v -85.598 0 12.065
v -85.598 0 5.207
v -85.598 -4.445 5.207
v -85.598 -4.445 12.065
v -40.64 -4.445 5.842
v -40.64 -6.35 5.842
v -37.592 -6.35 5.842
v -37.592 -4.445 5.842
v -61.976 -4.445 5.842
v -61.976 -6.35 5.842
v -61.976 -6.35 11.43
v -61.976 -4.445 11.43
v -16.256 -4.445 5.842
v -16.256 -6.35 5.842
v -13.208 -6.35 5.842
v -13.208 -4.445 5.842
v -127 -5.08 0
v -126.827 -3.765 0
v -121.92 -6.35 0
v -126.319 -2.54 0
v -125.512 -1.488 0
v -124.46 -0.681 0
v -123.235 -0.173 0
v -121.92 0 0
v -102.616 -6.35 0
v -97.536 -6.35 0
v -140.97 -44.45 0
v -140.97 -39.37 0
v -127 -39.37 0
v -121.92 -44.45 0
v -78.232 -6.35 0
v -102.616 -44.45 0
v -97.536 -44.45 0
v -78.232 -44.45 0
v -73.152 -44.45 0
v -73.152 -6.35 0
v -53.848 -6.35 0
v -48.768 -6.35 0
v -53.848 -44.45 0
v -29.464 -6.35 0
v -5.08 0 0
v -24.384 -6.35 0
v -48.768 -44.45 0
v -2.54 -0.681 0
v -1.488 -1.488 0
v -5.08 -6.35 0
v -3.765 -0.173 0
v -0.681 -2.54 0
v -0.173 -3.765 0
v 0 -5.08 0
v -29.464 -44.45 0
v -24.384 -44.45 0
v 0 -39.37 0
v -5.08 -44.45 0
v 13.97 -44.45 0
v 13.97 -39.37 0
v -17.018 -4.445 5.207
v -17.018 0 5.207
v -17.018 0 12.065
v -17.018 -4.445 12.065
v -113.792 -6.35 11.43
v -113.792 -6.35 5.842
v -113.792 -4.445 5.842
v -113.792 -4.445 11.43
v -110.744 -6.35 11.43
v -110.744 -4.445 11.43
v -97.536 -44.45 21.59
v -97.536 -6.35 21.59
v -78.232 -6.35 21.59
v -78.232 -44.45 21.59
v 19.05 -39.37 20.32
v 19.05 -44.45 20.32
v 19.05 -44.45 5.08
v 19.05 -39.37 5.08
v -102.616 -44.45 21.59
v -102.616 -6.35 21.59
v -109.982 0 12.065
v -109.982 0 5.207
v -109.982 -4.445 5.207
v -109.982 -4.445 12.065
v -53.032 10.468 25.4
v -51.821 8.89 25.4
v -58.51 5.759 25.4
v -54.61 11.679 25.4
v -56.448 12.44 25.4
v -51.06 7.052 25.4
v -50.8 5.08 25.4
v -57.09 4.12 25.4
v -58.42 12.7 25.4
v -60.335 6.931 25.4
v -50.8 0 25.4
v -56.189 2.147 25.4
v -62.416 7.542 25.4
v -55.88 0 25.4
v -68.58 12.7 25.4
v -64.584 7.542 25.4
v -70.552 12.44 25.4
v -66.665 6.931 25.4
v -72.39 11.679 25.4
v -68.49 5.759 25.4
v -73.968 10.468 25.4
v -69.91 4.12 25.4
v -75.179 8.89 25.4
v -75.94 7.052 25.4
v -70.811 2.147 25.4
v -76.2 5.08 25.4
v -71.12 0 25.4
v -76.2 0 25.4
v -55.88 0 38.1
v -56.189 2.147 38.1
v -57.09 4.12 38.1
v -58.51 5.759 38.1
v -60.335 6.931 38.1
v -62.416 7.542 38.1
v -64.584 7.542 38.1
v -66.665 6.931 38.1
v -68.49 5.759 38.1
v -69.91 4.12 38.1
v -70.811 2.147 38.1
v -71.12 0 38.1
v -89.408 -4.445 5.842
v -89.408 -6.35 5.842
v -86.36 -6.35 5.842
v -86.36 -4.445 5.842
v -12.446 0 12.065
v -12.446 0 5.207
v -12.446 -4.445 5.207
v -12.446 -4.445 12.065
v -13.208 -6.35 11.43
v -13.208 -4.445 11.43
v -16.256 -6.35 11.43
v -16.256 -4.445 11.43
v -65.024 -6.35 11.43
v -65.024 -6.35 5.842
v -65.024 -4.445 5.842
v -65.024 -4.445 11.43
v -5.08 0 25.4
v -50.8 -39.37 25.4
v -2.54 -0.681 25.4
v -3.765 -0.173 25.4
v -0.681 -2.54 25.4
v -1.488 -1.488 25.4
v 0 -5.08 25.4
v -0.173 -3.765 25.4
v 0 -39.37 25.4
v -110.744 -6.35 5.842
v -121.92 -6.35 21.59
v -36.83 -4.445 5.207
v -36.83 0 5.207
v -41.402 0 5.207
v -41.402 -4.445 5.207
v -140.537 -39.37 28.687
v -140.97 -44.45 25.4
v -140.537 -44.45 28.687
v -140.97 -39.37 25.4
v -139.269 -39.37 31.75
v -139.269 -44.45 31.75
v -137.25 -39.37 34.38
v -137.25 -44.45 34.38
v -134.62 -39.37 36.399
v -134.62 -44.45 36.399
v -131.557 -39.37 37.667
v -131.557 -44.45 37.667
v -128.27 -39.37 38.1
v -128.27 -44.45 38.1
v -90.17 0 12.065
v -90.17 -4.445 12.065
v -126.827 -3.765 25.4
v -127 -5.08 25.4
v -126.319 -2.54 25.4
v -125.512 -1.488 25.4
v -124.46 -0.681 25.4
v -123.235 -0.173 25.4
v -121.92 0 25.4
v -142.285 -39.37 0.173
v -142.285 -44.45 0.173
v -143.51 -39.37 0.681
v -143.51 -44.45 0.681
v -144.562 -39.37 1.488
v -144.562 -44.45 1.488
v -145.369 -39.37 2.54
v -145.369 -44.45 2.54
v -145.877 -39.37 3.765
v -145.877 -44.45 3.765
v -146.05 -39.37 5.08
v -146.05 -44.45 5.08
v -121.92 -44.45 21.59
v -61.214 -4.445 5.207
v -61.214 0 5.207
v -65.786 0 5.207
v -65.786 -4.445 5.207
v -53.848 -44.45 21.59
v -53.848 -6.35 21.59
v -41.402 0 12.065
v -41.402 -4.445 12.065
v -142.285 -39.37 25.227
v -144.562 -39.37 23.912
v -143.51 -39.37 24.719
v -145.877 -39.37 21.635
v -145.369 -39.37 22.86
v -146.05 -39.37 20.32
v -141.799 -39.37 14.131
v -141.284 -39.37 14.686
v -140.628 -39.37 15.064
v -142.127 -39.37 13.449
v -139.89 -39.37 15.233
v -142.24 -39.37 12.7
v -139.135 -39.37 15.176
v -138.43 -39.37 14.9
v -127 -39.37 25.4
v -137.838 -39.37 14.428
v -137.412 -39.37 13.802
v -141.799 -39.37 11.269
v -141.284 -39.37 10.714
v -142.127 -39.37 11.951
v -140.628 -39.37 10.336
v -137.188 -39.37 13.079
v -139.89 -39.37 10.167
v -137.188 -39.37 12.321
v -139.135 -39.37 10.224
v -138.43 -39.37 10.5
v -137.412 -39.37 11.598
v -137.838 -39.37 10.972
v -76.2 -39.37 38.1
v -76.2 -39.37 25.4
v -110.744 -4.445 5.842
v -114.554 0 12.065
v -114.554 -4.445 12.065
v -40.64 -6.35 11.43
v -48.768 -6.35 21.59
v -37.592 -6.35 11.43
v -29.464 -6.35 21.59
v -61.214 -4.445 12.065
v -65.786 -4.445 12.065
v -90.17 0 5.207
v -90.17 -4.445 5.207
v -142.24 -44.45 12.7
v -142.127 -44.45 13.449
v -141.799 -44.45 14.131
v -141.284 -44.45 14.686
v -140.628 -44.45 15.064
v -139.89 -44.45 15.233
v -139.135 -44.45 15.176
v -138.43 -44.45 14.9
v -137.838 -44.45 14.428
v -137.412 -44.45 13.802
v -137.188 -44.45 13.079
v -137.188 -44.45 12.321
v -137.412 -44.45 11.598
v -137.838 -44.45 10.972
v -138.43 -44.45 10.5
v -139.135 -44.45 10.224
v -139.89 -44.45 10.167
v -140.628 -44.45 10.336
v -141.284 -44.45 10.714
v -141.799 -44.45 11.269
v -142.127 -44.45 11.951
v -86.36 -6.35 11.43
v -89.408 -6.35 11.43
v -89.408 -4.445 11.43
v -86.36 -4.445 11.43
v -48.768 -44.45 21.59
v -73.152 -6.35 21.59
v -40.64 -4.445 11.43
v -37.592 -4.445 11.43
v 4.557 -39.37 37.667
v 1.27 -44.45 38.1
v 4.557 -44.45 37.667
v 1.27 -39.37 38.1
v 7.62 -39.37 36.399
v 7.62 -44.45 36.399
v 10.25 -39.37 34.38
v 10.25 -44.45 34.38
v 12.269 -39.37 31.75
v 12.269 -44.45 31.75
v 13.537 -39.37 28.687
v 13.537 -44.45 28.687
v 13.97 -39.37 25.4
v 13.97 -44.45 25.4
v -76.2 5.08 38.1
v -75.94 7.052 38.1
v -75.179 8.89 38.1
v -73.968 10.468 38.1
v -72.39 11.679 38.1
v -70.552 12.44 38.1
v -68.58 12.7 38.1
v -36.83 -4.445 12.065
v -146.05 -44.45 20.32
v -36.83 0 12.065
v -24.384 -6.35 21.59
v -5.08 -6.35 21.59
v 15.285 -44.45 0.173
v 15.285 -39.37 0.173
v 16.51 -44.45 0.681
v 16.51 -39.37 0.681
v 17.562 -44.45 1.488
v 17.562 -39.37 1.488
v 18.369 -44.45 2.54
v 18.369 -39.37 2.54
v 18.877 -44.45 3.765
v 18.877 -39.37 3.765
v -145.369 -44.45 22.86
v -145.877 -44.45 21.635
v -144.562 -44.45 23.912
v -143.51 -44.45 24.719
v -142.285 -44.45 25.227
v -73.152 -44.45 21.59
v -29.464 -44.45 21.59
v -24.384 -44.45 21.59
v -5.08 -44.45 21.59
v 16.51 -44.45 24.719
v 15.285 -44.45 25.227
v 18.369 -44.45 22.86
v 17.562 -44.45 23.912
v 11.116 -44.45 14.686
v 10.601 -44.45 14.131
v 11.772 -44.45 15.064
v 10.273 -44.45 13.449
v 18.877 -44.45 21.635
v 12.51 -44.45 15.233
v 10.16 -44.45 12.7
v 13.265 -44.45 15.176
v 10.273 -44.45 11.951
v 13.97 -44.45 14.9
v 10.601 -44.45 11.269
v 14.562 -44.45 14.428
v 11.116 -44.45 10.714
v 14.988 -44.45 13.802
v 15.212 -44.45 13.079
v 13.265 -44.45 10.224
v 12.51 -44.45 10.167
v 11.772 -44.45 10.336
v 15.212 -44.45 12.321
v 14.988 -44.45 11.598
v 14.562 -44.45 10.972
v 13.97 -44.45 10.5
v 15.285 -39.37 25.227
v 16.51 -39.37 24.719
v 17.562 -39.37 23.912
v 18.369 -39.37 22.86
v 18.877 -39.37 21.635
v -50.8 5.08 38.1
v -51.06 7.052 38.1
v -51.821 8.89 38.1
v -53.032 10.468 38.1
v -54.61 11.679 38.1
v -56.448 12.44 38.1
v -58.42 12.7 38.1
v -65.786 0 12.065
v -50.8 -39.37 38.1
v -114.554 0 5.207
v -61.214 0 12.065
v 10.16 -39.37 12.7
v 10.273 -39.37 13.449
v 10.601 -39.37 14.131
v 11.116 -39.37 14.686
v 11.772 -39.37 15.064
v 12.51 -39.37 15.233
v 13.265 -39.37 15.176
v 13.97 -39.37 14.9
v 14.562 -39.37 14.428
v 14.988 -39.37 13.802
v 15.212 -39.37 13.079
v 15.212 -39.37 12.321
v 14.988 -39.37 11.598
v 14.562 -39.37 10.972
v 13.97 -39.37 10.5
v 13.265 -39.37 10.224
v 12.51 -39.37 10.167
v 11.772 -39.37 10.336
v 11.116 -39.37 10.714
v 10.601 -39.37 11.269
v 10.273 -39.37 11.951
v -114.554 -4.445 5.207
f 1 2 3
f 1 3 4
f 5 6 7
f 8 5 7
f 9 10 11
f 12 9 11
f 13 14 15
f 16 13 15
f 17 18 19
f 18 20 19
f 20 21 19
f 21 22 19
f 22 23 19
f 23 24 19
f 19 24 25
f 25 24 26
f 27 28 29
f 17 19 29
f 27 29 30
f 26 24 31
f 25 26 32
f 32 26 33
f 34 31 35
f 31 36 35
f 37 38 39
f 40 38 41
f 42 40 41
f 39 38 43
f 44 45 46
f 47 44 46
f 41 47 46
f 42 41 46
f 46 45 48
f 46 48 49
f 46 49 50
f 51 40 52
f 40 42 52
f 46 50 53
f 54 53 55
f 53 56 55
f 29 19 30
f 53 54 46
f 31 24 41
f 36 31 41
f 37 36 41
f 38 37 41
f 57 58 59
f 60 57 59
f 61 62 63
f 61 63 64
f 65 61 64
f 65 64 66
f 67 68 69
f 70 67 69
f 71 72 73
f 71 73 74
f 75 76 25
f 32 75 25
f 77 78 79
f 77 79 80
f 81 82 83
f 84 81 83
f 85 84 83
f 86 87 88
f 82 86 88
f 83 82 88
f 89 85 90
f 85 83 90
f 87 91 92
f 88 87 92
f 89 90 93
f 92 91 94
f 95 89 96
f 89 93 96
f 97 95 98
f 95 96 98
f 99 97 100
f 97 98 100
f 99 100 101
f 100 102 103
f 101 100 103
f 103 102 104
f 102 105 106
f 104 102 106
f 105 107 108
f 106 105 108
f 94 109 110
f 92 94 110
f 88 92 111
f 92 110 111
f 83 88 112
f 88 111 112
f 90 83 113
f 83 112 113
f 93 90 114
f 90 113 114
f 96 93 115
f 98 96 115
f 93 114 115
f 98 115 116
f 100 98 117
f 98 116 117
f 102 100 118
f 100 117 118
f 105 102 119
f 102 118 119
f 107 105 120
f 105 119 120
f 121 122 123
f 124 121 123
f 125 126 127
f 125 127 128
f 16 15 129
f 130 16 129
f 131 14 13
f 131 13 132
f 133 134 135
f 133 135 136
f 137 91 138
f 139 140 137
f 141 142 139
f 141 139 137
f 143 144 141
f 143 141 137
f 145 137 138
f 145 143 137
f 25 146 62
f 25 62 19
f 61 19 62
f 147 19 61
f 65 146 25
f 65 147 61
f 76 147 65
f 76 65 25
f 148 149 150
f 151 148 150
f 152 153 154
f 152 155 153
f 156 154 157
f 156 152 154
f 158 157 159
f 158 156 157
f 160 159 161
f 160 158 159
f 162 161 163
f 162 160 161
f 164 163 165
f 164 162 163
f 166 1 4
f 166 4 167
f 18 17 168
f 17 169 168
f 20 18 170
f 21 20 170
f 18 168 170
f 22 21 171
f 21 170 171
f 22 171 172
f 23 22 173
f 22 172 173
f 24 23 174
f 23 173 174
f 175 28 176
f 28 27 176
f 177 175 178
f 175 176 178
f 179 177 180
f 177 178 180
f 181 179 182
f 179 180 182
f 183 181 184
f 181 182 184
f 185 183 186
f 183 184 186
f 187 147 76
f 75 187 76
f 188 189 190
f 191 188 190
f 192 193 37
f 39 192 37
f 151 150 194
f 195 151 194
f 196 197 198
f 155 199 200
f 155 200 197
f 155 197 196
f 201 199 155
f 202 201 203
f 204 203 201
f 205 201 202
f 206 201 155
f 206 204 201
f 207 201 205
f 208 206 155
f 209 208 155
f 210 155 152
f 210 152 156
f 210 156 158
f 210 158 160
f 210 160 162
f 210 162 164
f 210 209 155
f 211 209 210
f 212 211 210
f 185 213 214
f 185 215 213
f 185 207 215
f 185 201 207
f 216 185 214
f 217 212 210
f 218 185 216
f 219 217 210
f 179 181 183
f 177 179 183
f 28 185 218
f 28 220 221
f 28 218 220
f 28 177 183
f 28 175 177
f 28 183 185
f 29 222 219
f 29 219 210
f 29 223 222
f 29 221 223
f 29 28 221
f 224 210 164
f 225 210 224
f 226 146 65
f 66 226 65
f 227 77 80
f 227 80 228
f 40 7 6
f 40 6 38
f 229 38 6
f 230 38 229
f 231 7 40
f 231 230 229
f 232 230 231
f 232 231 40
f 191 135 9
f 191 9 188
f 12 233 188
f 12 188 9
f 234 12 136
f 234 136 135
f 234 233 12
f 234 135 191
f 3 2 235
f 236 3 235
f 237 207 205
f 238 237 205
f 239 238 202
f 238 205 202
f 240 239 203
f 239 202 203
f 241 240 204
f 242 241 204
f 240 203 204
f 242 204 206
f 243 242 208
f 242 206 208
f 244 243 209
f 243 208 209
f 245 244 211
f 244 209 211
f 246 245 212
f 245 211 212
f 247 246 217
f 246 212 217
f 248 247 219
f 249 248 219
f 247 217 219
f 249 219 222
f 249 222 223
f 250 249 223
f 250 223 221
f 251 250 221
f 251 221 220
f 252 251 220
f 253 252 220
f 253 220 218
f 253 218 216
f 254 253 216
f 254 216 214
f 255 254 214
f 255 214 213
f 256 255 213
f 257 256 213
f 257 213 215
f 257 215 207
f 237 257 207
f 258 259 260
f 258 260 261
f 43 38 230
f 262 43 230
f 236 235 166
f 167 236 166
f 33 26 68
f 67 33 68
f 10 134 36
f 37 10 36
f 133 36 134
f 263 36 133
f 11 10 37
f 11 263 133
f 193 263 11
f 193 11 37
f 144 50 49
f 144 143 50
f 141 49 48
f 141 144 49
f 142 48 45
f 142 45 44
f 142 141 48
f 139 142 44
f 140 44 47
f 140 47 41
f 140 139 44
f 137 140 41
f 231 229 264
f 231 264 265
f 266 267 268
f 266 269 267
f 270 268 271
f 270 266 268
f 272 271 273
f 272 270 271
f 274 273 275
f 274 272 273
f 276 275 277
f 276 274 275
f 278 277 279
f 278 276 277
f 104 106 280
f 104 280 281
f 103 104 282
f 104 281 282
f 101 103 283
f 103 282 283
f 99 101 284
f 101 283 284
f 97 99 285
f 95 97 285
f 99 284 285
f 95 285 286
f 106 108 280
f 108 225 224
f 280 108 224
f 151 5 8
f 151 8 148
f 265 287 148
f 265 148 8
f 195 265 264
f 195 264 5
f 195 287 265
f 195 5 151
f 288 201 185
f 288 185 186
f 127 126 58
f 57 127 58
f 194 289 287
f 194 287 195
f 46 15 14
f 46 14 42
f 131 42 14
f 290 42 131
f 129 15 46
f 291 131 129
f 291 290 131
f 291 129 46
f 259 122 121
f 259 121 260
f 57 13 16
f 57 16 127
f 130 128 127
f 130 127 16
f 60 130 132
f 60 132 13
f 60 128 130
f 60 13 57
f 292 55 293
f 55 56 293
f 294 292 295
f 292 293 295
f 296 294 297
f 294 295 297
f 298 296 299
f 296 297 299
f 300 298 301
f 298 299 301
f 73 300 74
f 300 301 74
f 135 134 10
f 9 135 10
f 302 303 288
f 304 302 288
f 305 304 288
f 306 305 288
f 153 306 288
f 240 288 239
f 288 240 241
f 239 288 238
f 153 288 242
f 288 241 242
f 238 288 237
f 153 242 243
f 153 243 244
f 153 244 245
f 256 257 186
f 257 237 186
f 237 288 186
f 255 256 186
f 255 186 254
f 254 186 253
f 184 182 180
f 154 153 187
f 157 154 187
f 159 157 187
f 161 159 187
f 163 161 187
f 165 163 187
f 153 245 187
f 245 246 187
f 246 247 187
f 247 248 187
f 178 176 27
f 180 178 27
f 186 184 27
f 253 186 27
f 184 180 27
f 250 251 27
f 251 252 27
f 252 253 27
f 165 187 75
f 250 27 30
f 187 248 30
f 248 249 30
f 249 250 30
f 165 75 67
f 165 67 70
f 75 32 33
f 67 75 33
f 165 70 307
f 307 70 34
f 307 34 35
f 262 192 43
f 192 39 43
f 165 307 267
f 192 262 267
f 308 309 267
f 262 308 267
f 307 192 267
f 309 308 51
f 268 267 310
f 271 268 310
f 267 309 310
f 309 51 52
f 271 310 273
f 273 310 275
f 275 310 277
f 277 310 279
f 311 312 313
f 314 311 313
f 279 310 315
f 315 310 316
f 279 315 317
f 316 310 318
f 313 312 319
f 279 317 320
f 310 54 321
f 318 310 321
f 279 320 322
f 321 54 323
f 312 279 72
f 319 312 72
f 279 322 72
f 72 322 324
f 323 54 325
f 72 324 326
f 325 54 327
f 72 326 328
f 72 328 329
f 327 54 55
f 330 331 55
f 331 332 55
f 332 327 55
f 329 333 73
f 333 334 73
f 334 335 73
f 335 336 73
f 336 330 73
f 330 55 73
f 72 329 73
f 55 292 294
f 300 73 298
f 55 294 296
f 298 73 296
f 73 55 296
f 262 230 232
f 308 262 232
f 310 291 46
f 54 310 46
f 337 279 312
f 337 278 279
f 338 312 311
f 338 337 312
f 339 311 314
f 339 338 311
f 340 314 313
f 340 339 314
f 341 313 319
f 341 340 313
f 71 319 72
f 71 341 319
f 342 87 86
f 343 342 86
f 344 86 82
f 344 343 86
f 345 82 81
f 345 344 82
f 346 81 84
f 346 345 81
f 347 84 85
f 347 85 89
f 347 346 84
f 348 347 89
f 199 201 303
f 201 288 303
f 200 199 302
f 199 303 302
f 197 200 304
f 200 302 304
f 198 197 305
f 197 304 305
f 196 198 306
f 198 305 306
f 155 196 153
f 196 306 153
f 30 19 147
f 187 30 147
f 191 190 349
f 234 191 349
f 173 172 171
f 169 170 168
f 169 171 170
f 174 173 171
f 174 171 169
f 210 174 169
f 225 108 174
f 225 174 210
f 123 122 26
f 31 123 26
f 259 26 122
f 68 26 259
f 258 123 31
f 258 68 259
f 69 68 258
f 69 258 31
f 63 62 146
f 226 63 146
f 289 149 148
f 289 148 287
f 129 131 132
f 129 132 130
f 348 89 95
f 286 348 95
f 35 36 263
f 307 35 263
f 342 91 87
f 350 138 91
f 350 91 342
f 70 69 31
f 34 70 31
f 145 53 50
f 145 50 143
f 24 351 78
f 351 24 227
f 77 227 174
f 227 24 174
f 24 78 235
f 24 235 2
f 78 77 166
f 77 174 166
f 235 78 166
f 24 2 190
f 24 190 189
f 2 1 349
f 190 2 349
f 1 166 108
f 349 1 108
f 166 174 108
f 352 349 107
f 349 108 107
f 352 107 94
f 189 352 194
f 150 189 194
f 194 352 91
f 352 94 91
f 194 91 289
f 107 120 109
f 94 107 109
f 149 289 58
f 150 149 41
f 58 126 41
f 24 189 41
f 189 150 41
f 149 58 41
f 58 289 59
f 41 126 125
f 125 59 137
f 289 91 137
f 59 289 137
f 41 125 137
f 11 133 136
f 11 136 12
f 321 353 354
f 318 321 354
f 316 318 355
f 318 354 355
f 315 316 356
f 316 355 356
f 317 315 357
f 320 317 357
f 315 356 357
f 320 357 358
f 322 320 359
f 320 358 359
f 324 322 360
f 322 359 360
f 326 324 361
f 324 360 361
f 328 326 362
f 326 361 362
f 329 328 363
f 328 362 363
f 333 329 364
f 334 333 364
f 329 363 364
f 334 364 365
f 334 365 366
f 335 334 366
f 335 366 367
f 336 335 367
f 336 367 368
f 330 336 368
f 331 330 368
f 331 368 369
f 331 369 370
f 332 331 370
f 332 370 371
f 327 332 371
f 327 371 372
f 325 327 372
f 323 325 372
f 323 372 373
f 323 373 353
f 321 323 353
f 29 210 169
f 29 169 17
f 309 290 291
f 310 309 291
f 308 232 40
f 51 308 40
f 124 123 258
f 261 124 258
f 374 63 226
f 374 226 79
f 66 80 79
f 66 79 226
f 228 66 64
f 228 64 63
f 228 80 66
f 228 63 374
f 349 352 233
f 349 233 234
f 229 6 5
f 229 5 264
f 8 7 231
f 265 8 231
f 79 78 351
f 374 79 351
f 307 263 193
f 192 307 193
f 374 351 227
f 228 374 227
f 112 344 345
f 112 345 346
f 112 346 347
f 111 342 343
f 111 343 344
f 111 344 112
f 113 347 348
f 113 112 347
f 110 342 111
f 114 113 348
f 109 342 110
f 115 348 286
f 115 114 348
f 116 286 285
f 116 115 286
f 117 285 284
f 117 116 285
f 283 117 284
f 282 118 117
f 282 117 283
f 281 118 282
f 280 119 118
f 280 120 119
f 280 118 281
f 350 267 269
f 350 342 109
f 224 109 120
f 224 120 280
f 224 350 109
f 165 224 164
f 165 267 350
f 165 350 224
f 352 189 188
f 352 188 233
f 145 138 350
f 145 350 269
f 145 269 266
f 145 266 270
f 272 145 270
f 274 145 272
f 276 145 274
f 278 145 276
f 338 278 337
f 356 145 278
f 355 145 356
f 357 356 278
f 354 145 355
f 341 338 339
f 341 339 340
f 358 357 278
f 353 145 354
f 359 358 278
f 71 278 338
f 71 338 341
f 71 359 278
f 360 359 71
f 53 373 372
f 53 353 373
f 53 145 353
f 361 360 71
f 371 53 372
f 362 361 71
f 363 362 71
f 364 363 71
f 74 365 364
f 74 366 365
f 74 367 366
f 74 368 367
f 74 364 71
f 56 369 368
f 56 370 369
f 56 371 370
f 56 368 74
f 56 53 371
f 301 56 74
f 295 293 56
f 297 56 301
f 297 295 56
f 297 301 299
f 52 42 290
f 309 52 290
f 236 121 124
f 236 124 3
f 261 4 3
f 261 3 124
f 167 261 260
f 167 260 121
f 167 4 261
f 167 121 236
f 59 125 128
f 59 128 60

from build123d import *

# Parameters (mm, degrees)
F0_W      = 127
F0_H      = 25.4
F1_DEPTH  = 6.35
F2_W      = 19.304
F2_H      = 3.81
F3_DEPTH  = 38.1
F4_W      = 3.048
F4_H      = 5.588
F5_DEPTH  = 6.351
F6_W      = 3.048
F6_H      = 5.588
F7_DEPTH  = 6.351
F8_W      = 4.572
F8_H      = 6.858
F8_W_2    = 3.048
F8_H_2    = 5.588
F9_DEPTH  = 4.445
F10_W     = 5.08
F10_H     = 25.4
F11_DEPTH = 19.05
F12_W     = 5.08
F12_H     = 25.4
F13_DEPTH = 19.05
F14_R     = 2.54
F15_DEPTH = 5.081
F16_R     = 5.08
F17_W     = 154.94
F17_H     = 5.08
F18_DEPTH = 12.7
F19_R     = 12.69999
F20_W     = 25.4
F20_H     = 39.37
F21_DEPTH = 12.7
F22_W     = 25.4
F22_H     = 12.7
F23_DEPTH = 12.7
F25_DEPTH = 38.101
F26_R     = 7.62


# Not quite as in the source:
# - a fillet or chamfer is up to 0.001 mm smaller than in the source, because OpenCascade refuses the exact size


with BuildPart() as f1:
    # F0 (on Front) → F1 (new body)
    with BuildSketch(Plane.XZ):
        with Locations((-63.5, 12.7)):
            Rectangle(F0_W, F0_H)
    extrude(amount=F1_DEPTH)

    # F2 (on face) → F3 (join)
    with BuildSketch(Plane.XZ.offset(6.35)):
        Polygon((-121.92, 25.4), (-127, 25.4), (-127, 0), (-121.92, 0), (-121.92, 21.59), align=None)
        with Locations((-112.268, 23.495)):
            Rectangle(F2_W, F2_H)
        Polygon((-97.536, 25.4), (-102.616, 25.4), (-102.616, 21.59), (-102.616, 0), (-97.536, 0), (-97.536, 21.59), align=None)
        with Locations((-87.884, 23.495)):
            Rectangle(F2_W, F2_H)
        Polygon((-73.152, 25.4), (-78.232, 25.4), (-78.232, 21.59), (-78.232, 0), (-73.152, 0), (-73.152, 21.59), align=None)
        with Locations((-63.5, 23.495)):
            Rectangle(F2_W, F2_H)
        Polygon((-48.768, 25.4), (-53.848, 25.4), (-53.848, 21.59), (-53.848, 0), (-48.768, 0), (-48.768, 21.59), align=None)
        with Locations((-39.116, 23.495)):
            Rectangle(F2_W, F2_H)
        Polygon((-24.384, 25.4), (-29.464, 25.4), (-29.464, 21.59), (-29.464, 0), (-24.384, 0), (-24.384, 21.59), align=None)
        with Locations((-14.732, 23.495)):
            Rectangle(F2_W, F2_H)
        Polygon((0, 25.4), (-5.08, 25.4), (-5.08, 21.59), (-5.08, 0), (0, 0), align=None)
    extrude(amount=F3_DEPTH)

    # F4 (on face) → F5 (cut, through all)
    with BuildSketch(Plane.XZ.offset(6.35)):
        with Locations((-14.732, 8.636)):
            Rectangle(F4_W, F4_H)
    extrude(amount=-F5_DEPTH, mode=Mode.SUBTRACT)

    # F6 (on face) → F7 (cut, through all)
    with BuildSketch(Plane.XZ.offset(6.35)):
        with Locations((-39.116, 8.636)):
            Rectangle(F6_W, F6_H)
        with Locations((-63.5, 8.636)):
            Rectangle(F6_W, F6_H)
        with Locations((-87.884, 8.636)):
            Rectangle(F6_W, F6_H)
        with Locations((-112.268, 8.636)):
            Rectangle(F6_W, F6_H)
    extrude(amount=-F7_DEPTH, mode=Mode.SUBTRACT)

    # F8 (on face) → F9 (cut)
    with BuildSketch(Plane(origin=(0, 0, 0), x_dir=(-1, 0, 0), z_dir=(0, 1, 0))):
        with Locations((14.732, 8.636)):
            Rectangle(F8_W, F8_H)
        with Locations((14.732, 8.636)):
            Rectangle(F8_W_2, F8_H_2, mode=Mode.SUBTRACT)
        with Locations((112.268, 8.636)):
            Rectangle(F8_W, F8_H)
        with Locations((112.268, 8.636)):
            Rectangle(F8_W_2, F8_H_2, mode=Mode.SUBTRACT)
        with Locations((87.884, 8.636)):
            Rectangle(F8_W, F8_H)
        with Locations((87.884, 8.636)):
            Rectangle(F8_W_2, F8_H_2, mode=Mode.SUBTRACT)
        with Locations((63.5, 8.636)):
            Rectangle(F8_W, F8_H)
        with Locations((63.5, 8.636)):
            Rectangle(F8_W_2, F8_H_2, mode=Mode.SUBTRACT)
        with Locations((39.116, 8.636)):
            Rectangle(F8_W, F8_H)
        with Locations((39.116, 8.636)):
            Rectangle(F8_W_2, F8_H_2, mode=Mode.SUBTRACT)
    extrude(amount=-F9_DEPTH, mode=Mode.SUBTRACT)

    # F10 (on face) → F11 (join)
    with BuildSketch(Plane.YZ):
        with Locations((-41.91, 12.7)):
            Rectangle(F10_W, F10_H)
    extrude(amount=F11_DEPTH)

    # F12 (on face) → F13 (join)
    with BuildSketch(Plane(origin=(-127, 0, 0), x_dir=(0, -1, 0), z_dir=(-1, 0, 0))):
        with Locations((41.91, 12.7)):
            Rectangle(F12_W, F12_H)
    extrude(amount=F13_DEPTH)

    # F14 (on face) → F15 (cut, through all)
    with BuildSketch(Plane(origin=(0, -39.37, 0), x_dir=(-1, 0, 0), z_dir=(0, 1, 0))):
        with Locations((-12.7, 12.7)):
            Circle(F14_R)
        with Locations((139.7, 12.7)):
            Circle(F14_R)
    extrude(amount=-F15_DEPTH, mode=Mode.SUBTRACT)

    # F16
    f16_edges = [f1.edges().sort_by_distance(p)[0] for p in [
        (19.05, -41.91, 0),
        (19.05, -41.91, 25.4),
        (-146.05, -41.91, 0),
        (-146.05, -41.91, 25.4),
        (-127, 0, 12.7),
        (0, 0, 12.7),
    ]]
    fillet(f16_edges, radius=F16_R)

    # F17 (on face) → F18 (join)
    with BuildSketch(Plane.XY.offset(25.4)):
        with Locations((-63.5, -41.91)):
            Rectangle(F17_W, F17_H)
    extrude(amount=F18_DEPTH)

    # F19 (radius 12.7 in the source; OpenCascade refuses exactly that, so slightly less here)
    f19_edges = [f1.edges().sort_by_distance(p)[0] for p in [
        (13.97, -41.91, 38.1),
        (-140.97, -41.91, 38.1),
    ]]
    fillet(f19_edges, radius=F19_R)

    # F20 (on face) → F21 (join)
    with BuildSketch(Plane.XY.offset(25.4)):
        with Locations((-63.5, -19.685)):
            Rectangle(F20_W, F20_H)
    extrude(amount=F21_DEPTH)

    # F22 (on face) → F23 (join)
    with BuildSketch(Plane(origin=(0, 0, 0), x_dir=(-1, 0, 0), z_dir=(0, 1, 0))):
        with Locations((63.5, 31.75)):
            Rectangle(F22_W, F22_H)
    extrude(amount=F23_DEPTH)

    # F24 (on face) → F25 (cut, through all)
    with BuildSketch(Plane.XY.offset(38.1)):
        with BuildLine():
            ThreePointArc((-55.88, 0), (-63.5, 7.62), (-71.12, 0))
            Line((-71.12, 0), (-55.88, 0))
        make_face()
    extrude(amount=-F25_DEPTH, mode=Mode.SUBTRACT)

    # F26
    f26_edges = [f1.edges().sort_by_distance(p)[0] for p in [
        (-50.8, 12.7, 31.75),
        (-76.2, 12.7, 31.75),
    ]]
    fillet(f26_edges, radius=F26_R)


solid = f1.part
